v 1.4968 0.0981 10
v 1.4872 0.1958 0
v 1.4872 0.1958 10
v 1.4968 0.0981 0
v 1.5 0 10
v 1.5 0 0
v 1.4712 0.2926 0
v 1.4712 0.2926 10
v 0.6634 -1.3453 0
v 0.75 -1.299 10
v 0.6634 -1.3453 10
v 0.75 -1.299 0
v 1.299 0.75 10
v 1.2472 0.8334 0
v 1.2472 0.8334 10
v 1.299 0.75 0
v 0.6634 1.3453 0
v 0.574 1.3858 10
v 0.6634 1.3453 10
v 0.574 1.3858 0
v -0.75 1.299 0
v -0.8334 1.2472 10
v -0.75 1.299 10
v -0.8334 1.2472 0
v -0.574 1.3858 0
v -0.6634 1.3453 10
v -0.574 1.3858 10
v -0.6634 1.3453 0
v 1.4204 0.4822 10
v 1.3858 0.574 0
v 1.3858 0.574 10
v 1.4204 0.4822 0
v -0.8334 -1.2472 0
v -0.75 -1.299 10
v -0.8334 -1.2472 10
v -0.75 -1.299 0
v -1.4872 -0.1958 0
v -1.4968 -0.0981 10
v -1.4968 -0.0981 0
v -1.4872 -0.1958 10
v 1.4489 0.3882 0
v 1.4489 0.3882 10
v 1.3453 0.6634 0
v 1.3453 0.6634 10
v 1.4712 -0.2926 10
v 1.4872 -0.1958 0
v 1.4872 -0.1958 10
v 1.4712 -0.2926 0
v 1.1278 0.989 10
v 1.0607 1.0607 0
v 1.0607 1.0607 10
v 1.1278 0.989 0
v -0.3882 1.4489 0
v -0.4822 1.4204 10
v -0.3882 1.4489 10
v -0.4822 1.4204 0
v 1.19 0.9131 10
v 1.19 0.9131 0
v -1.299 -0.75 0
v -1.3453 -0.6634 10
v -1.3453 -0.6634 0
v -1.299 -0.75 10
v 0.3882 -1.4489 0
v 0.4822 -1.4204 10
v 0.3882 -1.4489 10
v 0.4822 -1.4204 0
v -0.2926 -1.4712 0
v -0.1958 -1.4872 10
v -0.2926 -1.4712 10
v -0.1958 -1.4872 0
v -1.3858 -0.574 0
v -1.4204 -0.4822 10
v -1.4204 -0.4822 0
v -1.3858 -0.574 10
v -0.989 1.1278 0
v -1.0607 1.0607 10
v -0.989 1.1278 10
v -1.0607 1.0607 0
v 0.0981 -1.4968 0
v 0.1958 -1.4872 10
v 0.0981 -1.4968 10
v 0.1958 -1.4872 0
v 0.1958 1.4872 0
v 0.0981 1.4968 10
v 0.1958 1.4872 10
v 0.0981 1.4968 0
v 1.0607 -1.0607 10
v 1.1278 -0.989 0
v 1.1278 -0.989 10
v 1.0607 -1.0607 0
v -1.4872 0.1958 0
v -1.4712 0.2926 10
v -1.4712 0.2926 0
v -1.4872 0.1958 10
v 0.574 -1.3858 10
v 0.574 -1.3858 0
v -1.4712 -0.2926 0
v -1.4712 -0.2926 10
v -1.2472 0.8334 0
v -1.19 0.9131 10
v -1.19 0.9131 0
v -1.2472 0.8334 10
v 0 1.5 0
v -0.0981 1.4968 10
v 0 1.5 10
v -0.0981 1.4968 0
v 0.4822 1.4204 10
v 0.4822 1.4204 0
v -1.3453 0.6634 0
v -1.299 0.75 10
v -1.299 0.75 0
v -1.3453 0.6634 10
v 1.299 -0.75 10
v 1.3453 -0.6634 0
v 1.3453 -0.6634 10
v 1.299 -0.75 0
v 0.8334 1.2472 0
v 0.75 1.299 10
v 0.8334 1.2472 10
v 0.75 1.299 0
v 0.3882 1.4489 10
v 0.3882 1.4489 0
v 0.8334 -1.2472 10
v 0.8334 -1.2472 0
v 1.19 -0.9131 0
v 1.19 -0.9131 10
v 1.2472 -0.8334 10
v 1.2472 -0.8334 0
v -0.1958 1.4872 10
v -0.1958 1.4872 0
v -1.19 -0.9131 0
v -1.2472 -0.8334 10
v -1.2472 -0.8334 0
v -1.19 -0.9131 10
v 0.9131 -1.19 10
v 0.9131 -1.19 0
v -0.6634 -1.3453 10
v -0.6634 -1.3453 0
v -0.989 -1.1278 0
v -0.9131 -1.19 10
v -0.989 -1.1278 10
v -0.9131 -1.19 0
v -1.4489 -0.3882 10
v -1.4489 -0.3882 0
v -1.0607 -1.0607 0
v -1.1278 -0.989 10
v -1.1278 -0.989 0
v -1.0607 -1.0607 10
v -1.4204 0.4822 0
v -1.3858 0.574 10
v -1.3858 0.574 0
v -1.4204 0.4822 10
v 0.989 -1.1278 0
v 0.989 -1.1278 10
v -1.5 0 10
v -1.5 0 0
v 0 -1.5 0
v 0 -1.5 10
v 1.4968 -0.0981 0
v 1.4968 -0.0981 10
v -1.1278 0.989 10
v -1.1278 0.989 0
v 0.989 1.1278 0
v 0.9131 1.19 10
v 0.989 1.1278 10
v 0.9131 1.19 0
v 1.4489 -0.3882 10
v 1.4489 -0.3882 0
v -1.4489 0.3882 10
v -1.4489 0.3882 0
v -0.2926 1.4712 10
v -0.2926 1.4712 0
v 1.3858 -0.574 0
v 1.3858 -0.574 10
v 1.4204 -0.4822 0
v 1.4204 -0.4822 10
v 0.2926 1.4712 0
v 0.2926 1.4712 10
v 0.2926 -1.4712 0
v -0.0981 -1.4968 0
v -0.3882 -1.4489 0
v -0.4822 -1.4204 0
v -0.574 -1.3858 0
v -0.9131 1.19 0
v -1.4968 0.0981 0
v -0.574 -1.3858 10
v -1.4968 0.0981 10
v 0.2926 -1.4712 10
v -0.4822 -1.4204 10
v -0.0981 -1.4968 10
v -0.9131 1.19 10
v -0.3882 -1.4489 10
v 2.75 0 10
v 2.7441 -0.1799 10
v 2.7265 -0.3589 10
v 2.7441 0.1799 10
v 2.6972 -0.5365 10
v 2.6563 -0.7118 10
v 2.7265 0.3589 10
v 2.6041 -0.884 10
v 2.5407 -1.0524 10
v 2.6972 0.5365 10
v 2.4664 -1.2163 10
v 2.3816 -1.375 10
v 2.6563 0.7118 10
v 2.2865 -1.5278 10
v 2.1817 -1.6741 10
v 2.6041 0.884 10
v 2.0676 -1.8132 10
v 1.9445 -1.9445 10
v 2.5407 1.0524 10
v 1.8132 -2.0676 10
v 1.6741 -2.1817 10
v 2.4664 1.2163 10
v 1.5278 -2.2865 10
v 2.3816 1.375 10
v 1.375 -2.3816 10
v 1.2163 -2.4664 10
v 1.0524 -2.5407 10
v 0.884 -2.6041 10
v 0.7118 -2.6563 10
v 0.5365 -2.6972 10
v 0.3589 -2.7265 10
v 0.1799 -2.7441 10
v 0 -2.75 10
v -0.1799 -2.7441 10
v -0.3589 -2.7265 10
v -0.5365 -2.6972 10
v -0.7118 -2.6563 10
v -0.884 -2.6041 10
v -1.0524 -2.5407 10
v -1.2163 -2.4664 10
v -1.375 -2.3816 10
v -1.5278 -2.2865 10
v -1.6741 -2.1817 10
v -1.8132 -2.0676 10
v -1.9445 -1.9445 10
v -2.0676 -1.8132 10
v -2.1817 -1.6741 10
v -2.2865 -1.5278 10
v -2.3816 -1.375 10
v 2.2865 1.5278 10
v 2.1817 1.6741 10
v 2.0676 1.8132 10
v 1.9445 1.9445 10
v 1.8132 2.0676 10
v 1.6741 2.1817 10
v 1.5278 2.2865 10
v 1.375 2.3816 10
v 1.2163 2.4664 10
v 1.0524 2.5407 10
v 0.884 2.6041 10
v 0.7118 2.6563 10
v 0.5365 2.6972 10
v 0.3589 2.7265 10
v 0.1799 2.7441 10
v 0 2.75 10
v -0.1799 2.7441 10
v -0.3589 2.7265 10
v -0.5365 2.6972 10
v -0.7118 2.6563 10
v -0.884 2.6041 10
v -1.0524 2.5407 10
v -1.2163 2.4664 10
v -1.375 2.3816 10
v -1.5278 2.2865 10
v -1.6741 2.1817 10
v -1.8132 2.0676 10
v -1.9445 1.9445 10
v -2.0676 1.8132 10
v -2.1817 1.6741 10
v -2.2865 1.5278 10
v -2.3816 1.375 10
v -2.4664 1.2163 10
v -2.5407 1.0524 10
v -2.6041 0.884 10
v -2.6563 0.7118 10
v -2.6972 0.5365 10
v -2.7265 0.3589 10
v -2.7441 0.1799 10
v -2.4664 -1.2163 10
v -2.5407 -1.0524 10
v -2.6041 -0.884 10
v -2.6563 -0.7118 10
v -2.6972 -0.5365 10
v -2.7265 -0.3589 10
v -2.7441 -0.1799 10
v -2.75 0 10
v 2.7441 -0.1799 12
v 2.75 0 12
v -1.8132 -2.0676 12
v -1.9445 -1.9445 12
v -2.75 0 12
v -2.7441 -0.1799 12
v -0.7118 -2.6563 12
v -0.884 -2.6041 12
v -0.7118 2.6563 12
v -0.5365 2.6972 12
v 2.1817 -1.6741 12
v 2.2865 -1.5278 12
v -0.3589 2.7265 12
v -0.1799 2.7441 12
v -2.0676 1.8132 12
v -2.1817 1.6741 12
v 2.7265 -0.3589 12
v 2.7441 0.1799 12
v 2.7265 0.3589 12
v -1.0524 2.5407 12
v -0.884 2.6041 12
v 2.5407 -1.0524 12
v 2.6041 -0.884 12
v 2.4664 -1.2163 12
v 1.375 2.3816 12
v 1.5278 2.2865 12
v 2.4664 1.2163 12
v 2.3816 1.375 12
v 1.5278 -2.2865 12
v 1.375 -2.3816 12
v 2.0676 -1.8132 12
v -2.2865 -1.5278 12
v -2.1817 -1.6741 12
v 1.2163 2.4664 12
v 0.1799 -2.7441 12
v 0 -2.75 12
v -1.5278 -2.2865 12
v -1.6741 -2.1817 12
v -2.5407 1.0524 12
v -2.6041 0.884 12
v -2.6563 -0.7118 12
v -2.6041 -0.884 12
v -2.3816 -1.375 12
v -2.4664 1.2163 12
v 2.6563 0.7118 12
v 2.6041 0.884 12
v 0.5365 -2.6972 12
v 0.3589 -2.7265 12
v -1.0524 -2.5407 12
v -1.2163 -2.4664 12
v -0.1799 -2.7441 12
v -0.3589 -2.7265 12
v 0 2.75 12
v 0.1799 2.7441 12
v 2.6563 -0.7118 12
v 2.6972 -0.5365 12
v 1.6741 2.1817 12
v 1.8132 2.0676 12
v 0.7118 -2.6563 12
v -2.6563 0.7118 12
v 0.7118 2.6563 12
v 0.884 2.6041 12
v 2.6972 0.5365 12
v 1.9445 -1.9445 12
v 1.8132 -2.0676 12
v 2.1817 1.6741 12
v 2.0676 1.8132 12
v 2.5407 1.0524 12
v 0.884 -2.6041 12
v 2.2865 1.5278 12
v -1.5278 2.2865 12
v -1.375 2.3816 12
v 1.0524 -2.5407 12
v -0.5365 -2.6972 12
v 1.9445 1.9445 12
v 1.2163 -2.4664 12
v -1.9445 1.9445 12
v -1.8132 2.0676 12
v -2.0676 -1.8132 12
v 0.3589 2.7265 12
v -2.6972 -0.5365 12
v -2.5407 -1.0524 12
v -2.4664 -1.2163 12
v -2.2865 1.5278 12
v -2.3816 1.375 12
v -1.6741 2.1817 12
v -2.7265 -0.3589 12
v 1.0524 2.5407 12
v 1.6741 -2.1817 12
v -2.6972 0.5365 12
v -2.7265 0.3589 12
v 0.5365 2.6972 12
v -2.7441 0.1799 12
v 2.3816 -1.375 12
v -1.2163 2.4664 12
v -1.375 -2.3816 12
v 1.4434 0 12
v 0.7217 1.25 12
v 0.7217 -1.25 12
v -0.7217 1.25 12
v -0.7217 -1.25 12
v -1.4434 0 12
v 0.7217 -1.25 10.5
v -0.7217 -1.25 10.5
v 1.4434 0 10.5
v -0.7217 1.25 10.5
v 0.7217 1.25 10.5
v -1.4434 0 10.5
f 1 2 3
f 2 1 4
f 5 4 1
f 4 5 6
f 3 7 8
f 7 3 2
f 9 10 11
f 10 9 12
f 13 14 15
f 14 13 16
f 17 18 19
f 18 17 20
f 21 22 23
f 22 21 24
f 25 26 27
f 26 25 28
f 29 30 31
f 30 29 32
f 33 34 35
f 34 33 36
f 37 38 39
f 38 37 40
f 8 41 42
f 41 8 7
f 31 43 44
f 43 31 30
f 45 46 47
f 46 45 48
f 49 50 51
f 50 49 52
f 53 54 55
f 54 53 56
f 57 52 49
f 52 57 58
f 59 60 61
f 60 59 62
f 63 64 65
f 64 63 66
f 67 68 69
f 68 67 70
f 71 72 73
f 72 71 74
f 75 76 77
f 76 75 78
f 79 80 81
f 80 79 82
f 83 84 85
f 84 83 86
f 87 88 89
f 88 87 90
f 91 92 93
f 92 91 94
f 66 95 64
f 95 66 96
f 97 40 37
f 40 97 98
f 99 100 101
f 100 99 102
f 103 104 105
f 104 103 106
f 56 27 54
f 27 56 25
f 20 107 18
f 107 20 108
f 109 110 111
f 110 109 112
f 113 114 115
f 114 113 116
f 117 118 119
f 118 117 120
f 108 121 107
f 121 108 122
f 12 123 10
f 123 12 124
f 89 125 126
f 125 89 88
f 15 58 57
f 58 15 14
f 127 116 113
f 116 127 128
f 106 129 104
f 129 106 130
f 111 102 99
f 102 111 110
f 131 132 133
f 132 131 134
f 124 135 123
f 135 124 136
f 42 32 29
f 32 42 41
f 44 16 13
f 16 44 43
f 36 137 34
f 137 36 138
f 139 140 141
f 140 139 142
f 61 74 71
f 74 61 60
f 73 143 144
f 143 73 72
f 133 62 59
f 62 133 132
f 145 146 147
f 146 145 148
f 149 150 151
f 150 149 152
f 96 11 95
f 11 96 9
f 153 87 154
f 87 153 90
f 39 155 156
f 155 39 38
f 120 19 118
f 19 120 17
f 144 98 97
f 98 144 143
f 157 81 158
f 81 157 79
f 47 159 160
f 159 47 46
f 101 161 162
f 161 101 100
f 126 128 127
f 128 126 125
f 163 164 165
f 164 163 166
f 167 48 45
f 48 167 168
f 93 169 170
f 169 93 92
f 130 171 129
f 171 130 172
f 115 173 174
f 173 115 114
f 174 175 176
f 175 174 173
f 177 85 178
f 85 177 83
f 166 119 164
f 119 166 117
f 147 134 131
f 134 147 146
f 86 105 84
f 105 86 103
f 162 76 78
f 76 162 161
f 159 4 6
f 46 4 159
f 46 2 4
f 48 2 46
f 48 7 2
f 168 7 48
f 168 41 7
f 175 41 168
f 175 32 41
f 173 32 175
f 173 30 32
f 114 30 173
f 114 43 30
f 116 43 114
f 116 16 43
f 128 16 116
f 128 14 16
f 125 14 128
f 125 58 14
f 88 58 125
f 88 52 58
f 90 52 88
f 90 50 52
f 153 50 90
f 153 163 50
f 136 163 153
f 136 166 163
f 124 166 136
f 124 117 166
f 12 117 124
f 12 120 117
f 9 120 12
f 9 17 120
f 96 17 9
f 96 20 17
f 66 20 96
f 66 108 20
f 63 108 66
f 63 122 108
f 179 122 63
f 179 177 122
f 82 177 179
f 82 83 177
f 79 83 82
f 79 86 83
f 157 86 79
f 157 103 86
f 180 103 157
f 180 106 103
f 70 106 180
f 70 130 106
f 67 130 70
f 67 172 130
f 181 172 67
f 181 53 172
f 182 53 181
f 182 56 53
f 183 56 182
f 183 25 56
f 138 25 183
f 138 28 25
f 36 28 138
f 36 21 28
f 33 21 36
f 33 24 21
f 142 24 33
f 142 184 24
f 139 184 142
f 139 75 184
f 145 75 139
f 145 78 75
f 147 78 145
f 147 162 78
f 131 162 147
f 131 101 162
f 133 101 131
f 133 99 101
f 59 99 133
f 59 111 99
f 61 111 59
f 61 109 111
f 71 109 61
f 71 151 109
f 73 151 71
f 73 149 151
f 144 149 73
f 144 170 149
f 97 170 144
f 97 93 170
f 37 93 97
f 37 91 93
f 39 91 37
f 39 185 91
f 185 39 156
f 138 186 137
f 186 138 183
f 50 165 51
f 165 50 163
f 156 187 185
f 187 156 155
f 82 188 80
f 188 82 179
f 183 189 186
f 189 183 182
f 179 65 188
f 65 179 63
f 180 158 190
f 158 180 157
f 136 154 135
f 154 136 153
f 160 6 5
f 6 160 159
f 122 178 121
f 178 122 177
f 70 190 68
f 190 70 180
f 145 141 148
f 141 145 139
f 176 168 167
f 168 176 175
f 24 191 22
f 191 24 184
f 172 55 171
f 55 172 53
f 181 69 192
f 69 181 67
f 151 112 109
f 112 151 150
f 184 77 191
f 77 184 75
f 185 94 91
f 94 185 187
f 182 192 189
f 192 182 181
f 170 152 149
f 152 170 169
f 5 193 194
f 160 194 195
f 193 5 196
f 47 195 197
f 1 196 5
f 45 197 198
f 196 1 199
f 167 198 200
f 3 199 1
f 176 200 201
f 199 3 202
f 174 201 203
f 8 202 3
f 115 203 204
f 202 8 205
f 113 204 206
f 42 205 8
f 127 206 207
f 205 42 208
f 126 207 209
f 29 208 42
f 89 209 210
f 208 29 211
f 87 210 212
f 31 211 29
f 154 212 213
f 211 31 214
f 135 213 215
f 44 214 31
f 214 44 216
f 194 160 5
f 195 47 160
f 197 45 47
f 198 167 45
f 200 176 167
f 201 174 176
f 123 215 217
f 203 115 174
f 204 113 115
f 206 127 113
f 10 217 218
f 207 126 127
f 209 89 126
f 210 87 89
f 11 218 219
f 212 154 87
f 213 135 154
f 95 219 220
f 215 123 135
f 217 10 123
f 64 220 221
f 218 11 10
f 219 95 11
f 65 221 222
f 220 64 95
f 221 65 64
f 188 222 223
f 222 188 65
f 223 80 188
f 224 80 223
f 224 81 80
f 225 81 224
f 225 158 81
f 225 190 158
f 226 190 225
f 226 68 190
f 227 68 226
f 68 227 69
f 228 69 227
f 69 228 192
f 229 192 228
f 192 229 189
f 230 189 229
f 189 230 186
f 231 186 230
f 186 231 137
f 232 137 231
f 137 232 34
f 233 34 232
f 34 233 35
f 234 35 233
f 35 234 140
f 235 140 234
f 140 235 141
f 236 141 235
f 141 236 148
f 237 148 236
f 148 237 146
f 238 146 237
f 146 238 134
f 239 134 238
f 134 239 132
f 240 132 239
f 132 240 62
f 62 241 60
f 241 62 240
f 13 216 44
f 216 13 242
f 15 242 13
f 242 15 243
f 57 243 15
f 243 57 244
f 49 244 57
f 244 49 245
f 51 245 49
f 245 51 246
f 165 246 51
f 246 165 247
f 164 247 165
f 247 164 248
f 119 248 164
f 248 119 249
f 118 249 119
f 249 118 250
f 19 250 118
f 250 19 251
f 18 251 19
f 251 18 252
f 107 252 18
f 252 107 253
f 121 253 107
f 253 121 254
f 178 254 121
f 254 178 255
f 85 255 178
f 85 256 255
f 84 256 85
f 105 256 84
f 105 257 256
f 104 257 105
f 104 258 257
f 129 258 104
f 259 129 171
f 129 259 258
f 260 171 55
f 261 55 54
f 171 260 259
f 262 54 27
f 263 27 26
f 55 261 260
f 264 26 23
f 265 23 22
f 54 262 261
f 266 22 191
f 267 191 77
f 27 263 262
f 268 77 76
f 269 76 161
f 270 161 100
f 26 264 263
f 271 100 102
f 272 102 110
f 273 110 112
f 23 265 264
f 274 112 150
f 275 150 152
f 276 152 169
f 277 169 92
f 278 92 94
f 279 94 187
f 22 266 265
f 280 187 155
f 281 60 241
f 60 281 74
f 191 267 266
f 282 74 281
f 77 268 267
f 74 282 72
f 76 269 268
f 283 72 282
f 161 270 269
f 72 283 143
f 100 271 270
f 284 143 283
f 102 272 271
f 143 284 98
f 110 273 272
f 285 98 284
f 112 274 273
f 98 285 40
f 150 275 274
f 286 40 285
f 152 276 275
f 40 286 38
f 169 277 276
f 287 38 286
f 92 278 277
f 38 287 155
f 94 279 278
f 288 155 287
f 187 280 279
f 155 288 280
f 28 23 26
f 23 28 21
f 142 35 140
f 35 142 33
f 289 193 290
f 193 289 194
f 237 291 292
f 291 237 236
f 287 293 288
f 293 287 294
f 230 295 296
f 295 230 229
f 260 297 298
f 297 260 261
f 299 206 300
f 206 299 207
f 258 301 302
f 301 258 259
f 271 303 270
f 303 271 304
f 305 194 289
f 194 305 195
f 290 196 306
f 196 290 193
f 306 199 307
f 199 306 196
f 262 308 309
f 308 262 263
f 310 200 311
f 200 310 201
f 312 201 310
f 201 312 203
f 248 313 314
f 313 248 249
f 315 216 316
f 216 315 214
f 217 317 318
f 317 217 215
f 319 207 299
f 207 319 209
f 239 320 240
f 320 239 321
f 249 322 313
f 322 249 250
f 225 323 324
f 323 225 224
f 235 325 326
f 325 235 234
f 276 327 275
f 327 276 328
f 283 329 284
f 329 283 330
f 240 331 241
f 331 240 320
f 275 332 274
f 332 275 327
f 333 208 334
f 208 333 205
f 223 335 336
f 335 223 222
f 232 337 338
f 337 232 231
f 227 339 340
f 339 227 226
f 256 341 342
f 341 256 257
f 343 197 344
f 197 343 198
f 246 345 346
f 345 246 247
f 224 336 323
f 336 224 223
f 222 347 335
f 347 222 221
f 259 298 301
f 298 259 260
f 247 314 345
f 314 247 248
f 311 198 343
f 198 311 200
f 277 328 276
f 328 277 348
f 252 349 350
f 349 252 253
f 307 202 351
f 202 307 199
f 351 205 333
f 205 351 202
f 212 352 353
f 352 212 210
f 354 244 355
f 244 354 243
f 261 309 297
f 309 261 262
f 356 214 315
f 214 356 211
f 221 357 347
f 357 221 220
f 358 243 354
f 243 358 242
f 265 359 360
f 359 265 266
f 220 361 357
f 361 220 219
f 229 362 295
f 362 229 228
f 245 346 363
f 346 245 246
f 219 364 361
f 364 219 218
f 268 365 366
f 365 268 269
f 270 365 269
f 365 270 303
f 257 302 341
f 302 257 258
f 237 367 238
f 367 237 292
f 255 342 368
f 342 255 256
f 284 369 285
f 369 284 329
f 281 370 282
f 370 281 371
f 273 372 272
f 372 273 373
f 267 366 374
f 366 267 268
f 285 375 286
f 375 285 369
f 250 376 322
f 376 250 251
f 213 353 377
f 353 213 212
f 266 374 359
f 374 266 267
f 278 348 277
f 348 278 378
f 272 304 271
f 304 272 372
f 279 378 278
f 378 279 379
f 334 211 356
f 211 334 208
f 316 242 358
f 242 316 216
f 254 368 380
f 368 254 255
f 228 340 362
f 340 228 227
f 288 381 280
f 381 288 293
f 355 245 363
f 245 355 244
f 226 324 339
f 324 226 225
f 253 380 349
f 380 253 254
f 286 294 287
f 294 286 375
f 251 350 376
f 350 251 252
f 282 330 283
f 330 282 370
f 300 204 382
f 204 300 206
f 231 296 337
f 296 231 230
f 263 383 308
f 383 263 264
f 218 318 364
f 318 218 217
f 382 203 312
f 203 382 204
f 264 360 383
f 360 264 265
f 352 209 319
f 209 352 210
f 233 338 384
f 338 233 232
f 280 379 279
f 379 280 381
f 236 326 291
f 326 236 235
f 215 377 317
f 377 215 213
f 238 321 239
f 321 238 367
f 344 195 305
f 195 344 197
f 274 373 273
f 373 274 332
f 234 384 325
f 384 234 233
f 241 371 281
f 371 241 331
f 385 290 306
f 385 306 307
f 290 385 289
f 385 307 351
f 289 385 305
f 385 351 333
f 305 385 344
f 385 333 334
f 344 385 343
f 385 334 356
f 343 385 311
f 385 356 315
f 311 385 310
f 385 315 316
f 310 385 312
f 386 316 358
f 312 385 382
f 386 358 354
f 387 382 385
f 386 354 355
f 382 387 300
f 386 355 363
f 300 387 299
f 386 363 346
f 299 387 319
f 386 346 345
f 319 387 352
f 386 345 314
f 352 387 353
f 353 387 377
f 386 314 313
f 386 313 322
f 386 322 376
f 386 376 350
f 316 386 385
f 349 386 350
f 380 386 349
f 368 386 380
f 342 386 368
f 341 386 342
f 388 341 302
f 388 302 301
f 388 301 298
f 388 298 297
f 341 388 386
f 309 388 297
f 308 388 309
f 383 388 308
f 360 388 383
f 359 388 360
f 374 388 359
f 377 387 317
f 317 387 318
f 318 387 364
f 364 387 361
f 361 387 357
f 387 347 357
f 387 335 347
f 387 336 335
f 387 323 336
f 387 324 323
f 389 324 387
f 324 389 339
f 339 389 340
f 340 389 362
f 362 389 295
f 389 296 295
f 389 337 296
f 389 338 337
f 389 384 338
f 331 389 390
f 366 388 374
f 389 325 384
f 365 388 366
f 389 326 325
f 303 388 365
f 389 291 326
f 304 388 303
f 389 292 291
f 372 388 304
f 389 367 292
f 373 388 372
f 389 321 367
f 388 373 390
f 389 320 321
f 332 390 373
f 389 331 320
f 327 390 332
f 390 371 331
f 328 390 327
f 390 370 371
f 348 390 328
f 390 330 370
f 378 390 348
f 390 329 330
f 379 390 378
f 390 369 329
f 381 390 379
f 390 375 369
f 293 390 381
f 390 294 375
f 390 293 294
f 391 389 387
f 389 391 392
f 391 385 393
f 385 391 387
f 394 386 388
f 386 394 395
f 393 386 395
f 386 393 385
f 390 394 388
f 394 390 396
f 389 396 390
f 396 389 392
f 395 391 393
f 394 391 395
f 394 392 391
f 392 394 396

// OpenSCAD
$fn = 96;

d_shaft = 3.0;
L = 10.0;

d_head = 5.5;
h_head = 2.0;

hex_flat = 2.5;          // approximate for M3 socket
hex_depth = 1.5;         // approximate socket depth
chamfer = 0.25;

module hex_prism(flat, h) {
    // flat-to-flat = flat
    r = flat / sqrt(3);  // circumradius for regular hex
    cylinder(h = h, r = r, $fn = 6);
}

module socket_head_cap_screw() {
    difference() {
        union() {
            // Shaft
            cylinder(h = L, d = d_shaft);

            // Head
            translate([0,0,L])
            cylinder(h = h_head, d = d_head);

            // Small top chamfer (adds a slight bevel by adding a frustum)
            translate([0,0,L + h_head - chamfer])
            cylinder(h = chamfer, d1 = d_head, d2 = d_head - 2*chamfer);
        }

        // Hex socket
        translate([0,0,L + h_head - hex_depth])
        hex_prism(hex_flat, hex_depth + 0.01);
    }
}

socket_head_cap_screw();
